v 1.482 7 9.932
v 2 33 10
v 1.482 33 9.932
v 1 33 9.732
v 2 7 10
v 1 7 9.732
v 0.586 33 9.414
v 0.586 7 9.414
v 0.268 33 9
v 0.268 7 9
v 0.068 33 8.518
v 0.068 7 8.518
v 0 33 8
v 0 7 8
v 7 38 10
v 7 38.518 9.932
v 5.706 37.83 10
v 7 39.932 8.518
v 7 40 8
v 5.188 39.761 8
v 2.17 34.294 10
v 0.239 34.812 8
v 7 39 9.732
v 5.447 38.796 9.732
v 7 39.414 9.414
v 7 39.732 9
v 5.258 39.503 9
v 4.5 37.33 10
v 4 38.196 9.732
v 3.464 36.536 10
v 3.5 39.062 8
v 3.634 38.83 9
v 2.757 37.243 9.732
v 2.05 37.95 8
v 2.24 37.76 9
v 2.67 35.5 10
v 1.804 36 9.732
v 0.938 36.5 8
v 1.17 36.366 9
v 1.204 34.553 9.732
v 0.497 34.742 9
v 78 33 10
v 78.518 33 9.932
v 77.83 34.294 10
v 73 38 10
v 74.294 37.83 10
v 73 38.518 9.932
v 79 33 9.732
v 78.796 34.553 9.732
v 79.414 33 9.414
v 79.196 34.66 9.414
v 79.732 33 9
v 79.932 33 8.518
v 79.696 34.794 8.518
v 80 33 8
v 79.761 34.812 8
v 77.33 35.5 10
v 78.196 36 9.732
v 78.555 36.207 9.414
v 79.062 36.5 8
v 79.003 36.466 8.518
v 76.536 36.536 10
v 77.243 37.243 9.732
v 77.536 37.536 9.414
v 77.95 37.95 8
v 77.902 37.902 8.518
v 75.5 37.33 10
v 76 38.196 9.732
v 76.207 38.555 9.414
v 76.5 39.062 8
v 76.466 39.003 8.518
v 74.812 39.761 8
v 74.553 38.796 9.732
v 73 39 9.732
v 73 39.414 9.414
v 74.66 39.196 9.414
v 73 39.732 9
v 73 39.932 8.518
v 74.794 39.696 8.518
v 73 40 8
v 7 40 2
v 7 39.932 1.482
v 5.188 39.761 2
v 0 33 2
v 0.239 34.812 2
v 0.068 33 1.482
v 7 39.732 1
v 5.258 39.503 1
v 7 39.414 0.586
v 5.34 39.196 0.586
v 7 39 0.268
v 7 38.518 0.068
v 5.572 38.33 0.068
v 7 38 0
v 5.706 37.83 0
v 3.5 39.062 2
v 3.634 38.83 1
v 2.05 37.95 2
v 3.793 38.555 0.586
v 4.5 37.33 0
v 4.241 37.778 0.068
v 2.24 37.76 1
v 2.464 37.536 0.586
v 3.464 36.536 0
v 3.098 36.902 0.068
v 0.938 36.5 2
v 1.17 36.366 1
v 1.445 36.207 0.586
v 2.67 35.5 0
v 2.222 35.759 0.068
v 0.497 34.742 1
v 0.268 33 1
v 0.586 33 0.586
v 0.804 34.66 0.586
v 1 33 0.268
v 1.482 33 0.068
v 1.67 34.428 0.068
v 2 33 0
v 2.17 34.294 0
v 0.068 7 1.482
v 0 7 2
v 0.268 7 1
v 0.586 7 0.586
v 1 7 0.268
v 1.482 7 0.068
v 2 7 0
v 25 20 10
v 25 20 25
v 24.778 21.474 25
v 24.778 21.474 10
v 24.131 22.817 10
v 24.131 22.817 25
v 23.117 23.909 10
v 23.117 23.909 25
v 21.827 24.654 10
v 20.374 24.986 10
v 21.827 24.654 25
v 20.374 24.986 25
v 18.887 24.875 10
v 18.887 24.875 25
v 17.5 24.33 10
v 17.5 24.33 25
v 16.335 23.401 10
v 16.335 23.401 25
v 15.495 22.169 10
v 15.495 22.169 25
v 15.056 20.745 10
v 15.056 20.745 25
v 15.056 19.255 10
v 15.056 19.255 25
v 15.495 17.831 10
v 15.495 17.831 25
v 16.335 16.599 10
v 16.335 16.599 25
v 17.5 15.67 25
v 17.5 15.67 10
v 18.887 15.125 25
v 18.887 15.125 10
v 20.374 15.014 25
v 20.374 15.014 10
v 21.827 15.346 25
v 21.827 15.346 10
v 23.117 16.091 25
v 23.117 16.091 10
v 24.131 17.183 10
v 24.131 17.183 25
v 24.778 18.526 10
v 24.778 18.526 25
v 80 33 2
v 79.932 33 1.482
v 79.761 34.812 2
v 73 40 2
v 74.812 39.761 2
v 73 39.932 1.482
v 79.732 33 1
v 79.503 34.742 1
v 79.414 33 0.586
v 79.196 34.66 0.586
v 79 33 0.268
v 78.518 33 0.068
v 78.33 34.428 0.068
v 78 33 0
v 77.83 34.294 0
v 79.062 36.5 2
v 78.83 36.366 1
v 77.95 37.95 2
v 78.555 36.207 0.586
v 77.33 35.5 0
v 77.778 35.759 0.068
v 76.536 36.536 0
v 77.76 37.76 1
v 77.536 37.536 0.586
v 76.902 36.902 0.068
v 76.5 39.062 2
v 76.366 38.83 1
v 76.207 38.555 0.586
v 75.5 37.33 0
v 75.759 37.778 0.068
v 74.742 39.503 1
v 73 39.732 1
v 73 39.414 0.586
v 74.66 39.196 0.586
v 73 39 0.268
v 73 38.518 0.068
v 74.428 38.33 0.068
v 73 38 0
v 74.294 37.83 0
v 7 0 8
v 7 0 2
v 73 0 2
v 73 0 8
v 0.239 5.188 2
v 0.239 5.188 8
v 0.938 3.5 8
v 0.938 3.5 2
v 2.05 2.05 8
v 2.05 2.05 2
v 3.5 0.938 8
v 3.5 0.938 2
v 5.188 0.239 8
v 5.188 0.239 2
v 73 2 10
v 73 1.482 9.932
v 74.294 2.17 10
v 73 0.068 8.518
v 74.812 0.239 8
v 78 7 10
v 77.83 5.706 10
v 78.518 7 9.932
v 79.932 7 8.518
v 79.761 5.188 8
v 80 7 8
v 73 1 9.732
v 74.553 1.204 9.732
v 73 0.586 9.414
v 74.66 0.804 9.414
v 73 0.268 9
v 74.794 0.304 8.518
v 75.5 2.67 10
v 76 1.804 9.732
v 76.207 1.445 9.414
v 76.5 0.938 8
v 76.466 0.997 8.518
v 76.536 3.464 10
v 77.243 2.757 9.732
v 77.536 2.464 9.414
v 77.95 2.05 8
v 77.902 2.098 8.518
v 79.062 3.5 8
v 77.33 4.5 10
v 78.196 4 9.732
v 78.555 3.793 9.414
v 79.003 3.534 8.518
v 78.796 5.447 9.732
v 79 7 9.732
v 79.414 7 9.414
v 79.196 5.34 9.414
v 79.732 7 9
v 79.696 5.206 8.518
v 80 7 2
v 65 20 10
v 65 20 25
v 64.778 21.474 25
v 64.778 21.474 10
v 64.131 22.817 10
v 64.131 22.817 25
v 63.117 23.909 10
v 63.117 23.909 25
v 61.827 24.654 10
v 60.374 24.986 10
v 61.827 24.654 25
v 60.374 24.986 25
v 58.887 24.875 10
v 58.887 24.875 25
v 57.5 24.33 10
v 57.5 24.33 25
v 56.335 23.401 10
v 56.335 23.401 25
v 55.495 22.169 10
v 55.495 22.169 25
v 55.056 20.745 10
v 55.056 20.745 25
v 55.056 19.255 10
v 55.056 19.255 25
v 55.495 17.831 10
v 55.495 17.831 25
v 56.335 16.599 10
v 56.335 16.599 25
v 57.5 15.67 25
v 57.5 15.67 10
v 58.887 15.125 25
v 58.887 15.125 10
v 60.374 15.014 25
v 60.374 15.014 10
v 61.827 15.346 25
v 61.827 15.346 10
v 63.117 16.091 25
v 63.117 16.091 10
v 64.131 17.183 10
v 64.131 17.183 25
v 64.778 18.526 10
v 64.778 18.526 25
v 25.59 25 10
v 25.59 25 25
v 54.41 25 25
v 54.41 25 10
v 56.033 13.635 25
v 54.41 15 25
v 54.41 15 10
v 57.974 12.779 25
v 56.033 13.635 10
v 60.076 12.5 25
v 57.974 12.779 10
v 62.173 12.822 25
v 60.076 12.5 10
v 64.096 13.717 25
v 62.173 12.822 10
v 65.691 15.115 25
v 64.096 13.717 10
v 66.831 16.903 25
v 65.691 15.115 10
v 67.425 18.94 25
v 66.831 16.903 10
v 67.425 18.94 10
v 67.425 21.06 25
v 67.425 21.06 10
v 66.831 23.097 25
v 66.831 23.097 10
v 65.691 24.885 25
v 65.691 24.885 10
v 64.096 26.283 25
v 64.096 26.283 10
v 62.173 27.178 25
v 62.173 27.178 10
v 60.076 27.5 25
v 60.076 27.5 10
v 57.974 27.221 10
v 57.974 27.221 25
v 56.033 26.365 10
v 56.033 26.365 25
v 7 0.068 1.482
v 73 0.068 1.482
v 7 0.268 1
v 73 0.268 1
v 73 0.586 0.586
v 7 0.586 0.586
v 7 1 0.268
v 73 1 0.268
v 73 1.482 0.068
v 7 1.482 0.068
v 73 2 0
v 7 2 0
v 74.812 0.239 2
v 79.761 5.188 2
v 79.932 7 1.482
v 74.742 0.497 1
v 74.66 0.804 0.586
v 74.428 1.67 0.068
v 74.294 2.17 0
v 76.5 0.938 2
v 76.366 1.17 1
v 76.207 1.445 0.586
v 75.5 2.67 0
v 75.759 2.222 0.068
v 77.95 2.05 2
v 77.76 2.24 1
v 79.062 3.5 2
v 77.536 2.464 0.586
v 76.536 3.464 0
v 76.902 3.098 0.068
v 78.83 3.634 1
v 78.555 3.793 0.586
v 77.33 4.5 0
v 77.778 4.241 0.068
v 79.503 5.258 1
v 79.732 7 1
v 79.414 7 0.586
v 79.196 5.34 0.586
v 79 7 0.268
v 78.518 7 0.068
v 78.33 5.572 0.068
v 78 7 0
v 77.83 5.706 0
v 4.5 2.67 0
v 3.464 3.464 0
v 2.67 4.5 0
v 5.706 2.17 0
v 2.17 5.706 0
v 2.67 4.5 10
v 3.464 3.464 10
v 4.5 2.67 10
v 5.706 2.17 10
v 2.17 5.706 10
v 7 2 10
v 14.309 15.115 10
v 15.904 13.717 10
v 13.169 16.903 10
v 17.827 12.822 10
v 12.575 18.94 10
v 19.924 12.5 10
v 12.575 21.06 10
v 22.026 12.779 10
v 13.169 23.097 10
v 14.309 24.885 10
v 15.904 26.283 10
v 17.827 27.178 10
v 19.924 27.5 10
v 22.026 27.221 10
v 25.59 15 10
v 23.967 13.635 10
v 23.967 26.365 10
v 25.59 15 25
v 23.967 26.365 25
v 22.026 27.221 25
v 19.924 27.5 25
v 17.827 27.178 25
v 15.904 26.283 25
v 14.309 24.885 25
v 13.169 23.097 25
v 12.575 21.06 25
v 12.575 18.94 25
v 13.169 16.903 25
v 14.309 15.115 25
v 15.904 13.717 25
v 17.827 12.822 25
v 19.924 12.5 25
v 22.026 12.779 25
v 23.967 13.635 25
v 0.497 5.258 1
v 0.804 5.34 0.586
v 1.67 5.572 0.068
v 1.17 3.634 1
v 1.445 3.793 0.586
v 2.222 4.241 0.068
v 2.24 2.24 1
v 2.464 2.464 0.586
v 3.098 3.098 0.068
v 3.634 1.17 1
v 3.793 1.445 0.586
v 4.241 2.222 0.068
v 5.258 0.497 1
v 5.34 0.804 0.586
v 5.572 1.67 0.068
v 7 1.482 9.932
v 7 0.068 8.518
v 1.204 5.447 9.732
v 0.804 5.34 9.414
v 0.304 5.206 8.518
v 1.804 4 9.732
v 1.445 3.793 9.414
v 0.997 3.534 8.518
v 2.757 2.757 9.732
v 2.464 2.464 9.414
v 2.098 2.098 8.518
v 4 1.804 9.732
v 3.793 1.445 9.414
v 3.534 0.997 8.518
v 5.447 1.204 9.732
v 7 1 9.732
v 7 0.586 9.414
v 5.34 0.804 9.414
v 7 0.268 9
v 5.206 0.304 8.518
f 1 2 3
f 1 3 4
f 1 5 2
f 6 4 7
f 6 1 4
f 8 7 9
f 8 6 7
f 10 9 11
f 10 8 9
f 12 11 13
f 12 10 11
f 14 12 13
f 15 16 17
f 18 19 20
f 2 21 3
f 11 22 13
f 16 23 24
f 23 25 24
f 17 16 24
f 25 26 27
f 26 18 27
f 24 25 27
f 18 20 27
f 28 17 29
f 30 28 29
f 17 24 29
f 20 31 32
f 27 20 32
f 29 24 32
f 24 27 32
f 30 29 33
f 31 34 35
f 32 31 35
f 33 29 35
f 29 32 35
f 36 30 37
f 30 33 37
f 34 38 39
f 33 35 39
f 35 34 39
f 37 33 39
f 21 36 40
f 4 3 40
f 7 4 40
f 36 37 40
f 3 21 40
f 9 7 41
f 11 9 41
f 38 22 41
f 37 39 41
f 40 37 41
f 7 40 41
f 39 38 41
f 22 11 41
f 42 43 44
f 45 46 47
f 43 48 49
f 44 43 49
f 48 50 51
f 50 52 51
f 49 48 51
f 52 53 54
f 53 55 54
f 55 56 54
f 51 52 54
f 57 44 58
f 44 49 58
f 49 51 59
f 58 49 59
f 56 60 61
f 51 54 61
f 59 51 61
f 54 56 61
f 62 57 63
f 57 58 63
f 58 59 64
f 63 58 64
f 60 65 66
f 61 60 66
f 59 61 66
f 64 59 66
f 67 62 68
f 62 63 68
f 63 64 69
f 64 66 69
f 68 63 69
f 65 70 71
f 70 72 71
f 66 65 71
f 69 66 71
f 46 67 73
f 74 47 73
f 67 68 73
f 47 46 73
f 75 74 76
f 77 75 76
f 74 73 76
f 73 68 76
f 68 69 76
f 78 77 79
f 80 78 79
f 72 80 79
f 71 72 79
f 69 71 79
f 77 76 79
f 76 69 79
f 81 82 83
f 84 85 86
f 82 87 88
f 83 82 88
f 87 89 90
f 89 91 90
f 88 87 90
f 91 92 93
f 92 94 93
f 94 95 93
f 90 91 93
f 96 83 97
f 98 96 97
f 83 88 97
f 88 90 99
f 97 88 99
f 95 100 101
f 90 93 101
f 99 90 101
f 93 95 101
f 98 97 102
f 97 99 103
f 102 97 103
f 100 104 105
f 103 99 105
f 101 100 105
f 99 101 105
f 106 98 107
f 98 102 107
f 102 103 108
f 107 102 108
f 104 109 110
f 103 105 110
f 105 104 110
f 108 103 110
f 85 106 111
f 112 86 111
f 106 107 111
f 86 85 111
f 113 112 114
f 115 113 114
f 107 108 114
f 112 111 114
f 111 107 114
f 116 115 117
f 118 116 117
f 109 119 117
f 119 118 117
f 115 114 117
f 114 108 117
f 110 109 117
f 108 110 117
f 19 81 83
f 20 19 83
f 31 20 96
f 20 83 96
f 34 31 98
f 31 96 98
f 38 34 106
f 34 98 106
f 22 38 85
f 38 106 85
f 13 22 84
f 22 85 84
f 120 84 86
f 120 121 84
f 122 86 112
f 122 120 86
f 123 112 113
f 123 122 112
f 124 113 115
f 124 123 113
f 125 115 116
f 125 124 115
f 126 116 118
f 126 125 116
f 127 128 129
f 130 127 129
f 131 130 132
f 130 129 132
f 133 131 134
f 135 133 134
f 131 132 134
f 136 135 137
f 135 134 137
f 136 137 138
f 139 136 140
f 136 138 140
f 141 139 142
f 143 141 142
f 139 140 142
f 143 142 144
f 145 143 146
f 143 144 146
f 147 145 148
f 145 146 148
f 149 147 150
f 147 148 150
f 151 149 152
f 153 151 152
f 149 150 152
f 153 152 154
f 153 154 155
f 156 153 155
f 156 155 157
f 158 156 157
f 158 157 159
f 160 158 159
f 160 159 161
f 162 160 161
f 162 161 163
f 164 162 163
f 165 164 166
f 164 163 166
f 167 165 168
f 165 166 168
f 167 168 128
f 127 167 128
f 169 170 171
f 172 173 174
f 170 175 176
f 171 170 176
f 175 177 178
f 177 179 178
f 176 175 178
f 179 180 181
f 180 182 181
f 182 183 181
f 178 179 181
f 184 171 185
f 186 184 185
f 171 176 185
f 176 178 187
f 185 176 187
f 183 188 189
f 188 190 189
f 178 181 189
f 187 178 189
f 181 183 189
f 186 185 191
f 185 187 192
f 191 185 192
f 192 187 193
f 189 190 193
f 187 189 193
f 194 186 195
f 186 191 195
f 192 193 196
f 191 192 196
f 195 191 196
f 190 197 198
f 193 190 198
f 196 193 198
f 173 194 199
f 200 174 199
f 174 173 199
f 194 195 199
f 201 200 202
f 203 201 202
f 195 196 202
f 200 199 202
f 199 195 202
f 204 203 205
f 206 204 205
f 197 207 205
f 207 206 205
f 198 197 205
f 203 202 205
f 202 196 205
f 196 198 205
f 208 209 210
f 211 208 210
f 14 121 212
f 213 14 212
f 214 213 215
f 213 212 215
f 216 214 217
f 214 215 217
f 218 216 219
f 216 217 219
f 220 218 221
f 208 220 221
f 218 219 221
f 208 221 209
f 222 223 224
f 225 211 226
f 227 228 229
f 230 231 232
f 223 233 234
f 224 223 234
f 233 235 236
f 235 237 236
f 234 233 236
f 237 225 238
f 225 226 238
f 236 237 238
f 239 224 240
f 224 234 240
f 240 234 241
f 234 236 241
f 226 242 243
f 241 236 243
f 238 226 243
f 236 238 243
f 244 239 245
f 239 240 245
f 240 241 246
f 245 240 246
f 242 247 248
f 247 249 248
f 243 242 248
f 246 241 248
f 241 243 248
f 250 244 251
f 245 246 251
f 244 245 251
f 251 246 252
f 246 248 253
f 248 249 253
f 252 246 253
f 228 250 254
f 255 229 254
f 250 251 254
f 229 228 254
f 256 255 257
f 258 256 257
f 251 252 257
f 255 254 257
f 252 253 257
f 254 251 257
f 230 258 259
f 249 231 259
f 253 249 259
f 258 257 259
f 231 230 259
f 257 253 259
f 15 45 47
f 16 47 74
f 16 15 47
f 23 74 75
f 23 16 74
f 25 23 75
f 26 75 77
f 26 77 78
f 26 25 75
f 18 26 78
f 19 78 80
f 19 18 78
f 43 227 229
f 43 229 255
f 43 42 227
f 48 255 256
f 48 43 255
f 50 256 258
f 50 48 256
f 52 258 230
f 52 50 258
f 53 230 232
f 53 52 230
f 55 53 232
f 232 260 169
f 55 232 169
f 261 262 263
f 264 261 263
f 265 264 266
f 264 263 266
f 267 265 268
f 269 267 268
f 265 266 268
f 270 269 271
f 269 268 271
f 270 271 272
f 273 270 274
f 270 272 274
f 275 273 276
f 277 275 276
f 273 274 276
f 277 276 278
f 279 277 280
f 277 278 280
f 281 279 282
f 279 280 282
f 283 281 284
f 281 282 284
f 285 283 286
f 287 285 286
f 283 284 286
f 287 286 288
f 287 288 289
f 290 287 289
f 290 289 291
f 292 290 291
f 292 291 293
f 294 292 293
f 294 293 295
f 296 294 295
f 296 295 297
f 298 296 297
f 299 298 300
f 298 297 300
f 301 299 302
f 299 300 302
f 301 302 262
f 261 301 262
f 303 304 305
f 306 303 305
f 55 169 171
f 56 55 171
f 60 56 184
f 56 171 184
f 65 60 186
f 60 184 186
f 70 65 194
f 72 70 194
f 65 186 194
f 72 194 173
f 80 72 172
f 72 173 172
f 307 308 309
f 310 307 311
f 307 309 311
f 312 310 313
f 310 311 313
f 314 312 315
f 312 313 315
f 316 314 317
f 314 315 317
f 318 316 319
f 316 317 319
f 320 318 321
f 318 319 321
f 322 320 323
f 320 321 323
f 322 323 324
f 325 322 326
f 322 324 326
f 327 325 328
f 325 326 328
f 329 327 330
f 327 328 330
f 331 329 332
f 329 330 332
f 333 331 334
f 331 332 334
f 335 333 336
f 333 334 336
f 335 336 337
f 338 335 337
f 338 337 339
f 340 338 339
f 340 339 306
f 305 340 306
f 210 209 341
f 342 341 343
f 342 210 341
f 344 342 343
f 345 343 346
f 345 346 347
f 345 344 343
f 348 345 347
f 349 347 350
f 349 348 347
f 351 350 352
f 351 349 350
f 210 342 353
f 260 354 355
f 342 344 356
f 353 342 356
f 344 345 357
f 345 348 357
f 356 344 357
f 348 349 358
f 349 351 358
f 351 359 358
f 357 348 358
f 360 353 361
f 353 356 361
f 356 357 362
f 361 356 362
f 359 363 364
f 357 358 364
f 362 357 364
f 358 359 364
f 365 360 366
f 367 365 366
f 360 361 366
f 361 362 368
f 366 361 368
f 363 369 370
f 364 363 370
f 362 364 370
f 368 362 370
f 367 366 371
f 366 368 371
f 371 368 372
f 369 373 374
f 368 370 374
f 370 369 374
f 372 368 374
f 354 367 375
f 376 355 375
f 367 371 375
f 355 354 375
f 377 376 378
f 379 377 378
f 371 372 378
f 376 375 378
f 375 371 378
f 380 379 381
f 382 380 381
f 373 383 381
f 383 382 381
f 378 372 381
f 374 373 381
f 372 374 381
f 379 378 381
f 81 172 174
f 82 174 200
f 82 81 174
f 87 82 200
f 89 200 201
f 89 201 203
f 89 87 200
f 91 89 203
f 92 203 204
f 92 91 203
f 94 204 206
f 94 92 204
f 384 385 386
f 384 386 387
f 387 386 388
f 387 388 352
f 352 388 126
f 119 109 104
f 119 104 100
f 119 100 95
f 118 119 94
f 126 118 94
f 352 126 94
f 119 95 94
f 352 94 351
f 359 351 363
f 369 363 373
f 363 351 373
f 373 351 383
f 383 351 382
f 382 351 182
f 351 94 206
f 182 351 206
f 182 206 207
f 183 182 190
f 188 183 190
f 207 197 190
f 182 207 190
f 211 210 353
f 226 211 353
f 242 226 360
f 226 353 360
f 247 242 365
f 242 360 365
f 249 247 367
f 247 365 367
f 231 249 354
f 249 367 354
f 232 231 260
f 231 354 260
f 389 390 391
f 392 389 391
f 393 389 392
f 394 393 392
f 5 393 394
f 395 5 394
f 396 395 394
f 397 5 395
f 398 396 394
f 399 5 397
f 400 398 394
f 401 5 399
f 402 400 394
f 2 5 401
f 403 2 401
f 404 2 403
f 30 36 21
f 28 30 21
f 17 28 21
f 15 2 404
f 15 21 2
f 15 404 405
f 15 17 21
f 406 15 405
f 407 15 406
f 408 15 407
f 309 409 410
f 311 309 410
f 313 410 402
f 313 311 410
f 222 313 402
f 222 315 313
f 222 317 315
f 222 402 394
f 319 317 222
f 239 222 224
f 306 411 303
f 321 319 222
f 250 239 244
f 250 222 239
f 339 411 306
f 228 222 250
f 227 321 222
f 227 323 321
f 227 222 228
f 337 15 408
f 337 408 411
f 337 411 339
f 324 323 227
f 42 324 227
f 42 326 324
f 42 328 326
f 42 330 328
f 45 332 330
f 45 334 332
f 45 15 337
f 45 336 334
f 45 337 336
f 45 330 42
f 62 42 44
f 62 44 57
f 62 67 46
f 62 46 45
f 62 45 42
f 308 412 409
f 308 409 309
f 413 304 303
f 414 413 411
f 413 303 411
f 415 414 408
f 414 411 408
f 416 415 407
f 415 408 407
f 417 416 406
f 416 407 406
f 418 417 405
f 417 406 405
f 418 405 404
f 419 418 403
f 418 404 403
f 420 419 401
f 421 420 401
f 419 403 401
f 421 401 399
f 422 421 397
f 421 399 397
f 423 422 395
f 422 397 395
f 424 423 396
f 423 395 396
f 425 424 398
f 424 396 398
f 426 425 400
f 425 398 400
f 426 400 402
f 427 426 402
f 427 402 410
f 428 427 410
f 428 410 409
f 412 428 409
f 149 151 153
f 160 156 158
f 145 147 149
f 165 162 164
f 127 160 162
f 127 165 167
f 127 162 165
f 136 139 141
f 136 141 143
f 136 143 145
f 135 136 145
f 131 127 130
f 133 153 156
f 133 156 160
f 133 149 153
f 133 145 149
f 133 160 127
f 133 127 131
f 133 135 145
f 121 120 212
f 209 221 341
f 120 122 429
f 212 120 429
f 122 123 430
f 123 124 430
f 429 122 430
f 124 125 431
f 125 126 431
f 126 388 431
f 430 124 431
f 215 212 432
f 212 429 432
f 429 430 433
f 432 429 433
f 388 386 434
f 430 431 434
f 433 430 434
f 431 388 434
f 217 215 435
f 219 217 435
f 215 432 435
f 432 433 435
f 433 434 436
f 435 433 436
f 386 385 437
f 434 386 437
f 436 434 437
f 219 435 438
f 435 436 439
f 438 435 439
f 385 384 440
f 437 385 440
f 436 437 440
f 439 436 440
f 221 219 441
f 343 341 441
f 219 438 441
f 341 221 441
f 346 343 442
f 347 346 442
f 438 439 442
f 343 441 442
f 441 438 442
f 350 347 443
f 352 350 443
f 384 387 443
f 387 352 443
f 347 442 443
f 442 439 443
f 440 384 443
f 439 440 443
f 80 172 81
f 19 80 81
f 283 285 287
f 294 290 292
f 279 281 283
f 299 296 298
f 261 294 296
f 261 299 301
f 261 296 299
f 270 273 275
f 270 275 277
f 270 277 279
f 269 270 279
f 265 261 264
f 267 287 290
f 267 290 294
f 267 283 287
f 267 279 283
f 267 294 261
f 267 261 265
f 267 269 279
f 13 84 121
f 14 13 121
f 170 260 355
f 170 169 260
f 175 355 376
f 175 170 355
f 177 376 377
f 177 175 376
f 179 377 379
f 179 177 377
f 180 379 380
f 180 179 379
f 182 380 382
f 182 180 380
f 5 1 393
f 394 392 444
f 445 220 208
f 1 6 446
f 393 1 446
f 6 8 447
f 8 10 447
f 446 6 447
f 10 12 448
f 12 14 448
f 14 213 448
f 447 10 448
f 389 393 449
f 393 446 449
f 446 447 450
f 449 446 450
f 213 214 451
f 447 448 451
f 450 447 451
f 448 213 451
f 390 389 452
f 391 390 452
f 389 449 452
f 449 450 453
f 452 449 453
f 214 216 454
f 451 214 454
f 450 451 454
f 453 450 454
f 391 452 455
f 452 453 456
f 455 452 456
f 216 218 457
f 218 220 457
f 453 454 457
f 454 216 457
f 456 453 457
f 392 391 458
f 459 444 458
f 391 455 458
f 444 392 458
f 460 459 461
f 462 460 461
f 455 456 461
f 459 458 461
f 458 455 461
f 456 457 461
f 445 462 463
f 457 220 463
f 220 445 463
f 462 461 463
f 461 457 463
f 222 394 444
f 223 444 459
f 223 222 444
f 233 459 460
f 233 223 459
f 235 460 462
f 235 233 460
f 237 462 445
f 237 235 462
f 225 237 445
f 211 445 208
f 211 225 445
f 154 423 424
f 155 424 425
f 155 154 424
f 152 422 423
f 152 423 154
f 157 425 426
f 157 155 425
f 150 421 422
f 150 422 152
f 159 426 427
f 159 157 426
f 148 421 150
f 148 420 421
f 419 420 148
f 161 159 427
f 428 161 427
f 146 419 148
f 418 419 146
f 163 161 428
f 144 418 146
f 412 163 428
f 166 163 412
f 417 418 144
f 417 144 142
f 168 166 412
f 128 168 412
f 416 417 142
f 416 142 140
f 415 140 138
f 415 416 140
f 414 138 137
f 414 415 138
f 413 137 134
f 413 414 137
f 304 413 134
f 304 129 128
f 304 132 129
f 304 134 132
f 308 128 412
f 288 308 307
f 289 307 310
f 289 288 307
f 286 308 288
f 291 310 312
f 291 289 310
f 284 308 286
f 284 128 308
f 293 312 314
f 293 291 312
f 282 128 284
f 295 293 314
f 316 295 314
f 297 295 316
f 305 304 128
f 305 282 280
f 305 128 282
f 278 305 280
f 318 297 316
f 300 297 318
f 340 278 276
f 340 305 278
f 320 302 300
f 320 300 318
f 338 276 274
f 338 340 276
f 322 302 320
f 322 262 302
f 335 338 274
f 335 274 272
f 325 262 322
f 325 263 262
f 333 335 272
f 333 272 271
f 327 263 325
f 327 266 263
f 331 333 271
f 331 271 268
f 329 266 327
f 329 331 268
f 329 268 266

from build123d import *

# Parameters (mm, degrees)
BOSS_EXTRUDE1_DEPTH = 10
FILLET1_R           = 2
FILLET2_R           = 2
SKETCH2_R           = 7.5
BOSS_EXTRUDE3_DEPTH = 15
SKETCH3_R           = 5
CUT_EXTRUDE1_DEPTH  = 15
SKETCH4_R           = 5
CUT_EXTRUDE2_DEPTH  = 15
RIB1_REACH          = 94.871
SKETCH5_WALLS_W     = 202.74175621
SKETCH5_WALLS_H     = 10


with BuildPart() as part:
    # Sketch1 → Boss-Extrude1 (new body)
    with BuildSketch(Plane.XY):
        with BuildLine():
            Line((7, 0), (73, 0))
            ThreePointArc((73, 0), (77.949747468, 2.050252532), (80, 7))
            Line((80, 7), (80, 33))
            ThreePointArc((80, 33), (77.949747468, 37.949747468), (73, 40))
            Line((73, 40), (7, 40))
            ThreePointArc((7, 40), (2.050252532, 37.949747468), (0, 33))
            Line((0, 33), (0, 7))
            ThreePointArc((0, 7), (2.050252532, 2.050252532), (7, 0))
        make_face()
    extrude(amount=BOSS_EXTRUDE1_DEPTH)

    # Fillet1
    fillet1_edges = [part.edges().sort_by_distance(p)[0] for p in [
        (40, 40, 0),
        (2.050252532, 37.949747468, 0),
        (0, 20, 0),
        (2.050252532, 2.050252532, 0),
        (40, 0, 0),
        (77.949747468, 2.050252532, 0),
        (80, 20, 0),
        (77.949747468, 37.949747468, 0),
    ]]
    fillet(fillet1_edges, radius=FILLET1_R)

    # Fillet2
    fillet2_edges = [part.edges().sort_by_distance(p)[0] for p in [
        (2.050252532, 37.949747468, 10),
        (40, 40, 10),
        (77.949747468, 37.949747468, 10),
        (80, 20, 10),
        (77.949747468, 2.050252532, 10),
        (40, 0, 10),
        (2.050252532, 2.050252532, 10),
        (0, 20, 10),
    ]]
    fillet(fillet2_edges, radius=FILLET2_R)

    # Sketch2 → Boss-Extrude3 (add)
    with BuildSketch(Plane.XY.offset(10)):
        with Locations(Location((20, 20, 0), (0, 0, 180))):
            Circle(SKETCH2_R)
        with Locations(Location((60, 20, 0), (0, 0, 180))):
            Circle(SKETCH2_R)
    extrude(amount=BOSS_EXTRUDE3_DEPTH)

    # Sketch3 → Cut-Extrude1 (cut)
    with BuildSketch(Plane.XY.offset(25)):
        with Locations((20, 20)):
            Circle(SKETCH3_R)
    extrude(amount=-CUT_EXTRUDE1_DEPTH, mode=Mode.SUBTRACT)

    # Sketch4 → Cut-Extrude2 (cut)
    with BuildSketch(Plane.XY.offset(25)):
        with Locations((60, 20)):
            Circle(SKETCH4_R)
    extrude(amount=-CUT_EXTRUDE2_DEPTH, mode=Mode.SUBTRACT)

    # Sketch5 walls → Rib1 (add, up to next)
    with BuildSketch(Plane.XY.offset(25), mode=Mode.PRIVATE) as rib1_sk1:
        with Locations((40.936137708, 20)):
            Rectangle(SKETCH5_WALLS_W, SKETCH5_WALLS_H)
    rib1_tool1 = extrude(rib1_sk1.sketch, amount=-RIB1_REACH, mode=Mode.PRIVATE) - part.part
    add(rib1_tool1.solids().sort_by_distance((40.936137708, 20, 25))[0])


solid = part.part
